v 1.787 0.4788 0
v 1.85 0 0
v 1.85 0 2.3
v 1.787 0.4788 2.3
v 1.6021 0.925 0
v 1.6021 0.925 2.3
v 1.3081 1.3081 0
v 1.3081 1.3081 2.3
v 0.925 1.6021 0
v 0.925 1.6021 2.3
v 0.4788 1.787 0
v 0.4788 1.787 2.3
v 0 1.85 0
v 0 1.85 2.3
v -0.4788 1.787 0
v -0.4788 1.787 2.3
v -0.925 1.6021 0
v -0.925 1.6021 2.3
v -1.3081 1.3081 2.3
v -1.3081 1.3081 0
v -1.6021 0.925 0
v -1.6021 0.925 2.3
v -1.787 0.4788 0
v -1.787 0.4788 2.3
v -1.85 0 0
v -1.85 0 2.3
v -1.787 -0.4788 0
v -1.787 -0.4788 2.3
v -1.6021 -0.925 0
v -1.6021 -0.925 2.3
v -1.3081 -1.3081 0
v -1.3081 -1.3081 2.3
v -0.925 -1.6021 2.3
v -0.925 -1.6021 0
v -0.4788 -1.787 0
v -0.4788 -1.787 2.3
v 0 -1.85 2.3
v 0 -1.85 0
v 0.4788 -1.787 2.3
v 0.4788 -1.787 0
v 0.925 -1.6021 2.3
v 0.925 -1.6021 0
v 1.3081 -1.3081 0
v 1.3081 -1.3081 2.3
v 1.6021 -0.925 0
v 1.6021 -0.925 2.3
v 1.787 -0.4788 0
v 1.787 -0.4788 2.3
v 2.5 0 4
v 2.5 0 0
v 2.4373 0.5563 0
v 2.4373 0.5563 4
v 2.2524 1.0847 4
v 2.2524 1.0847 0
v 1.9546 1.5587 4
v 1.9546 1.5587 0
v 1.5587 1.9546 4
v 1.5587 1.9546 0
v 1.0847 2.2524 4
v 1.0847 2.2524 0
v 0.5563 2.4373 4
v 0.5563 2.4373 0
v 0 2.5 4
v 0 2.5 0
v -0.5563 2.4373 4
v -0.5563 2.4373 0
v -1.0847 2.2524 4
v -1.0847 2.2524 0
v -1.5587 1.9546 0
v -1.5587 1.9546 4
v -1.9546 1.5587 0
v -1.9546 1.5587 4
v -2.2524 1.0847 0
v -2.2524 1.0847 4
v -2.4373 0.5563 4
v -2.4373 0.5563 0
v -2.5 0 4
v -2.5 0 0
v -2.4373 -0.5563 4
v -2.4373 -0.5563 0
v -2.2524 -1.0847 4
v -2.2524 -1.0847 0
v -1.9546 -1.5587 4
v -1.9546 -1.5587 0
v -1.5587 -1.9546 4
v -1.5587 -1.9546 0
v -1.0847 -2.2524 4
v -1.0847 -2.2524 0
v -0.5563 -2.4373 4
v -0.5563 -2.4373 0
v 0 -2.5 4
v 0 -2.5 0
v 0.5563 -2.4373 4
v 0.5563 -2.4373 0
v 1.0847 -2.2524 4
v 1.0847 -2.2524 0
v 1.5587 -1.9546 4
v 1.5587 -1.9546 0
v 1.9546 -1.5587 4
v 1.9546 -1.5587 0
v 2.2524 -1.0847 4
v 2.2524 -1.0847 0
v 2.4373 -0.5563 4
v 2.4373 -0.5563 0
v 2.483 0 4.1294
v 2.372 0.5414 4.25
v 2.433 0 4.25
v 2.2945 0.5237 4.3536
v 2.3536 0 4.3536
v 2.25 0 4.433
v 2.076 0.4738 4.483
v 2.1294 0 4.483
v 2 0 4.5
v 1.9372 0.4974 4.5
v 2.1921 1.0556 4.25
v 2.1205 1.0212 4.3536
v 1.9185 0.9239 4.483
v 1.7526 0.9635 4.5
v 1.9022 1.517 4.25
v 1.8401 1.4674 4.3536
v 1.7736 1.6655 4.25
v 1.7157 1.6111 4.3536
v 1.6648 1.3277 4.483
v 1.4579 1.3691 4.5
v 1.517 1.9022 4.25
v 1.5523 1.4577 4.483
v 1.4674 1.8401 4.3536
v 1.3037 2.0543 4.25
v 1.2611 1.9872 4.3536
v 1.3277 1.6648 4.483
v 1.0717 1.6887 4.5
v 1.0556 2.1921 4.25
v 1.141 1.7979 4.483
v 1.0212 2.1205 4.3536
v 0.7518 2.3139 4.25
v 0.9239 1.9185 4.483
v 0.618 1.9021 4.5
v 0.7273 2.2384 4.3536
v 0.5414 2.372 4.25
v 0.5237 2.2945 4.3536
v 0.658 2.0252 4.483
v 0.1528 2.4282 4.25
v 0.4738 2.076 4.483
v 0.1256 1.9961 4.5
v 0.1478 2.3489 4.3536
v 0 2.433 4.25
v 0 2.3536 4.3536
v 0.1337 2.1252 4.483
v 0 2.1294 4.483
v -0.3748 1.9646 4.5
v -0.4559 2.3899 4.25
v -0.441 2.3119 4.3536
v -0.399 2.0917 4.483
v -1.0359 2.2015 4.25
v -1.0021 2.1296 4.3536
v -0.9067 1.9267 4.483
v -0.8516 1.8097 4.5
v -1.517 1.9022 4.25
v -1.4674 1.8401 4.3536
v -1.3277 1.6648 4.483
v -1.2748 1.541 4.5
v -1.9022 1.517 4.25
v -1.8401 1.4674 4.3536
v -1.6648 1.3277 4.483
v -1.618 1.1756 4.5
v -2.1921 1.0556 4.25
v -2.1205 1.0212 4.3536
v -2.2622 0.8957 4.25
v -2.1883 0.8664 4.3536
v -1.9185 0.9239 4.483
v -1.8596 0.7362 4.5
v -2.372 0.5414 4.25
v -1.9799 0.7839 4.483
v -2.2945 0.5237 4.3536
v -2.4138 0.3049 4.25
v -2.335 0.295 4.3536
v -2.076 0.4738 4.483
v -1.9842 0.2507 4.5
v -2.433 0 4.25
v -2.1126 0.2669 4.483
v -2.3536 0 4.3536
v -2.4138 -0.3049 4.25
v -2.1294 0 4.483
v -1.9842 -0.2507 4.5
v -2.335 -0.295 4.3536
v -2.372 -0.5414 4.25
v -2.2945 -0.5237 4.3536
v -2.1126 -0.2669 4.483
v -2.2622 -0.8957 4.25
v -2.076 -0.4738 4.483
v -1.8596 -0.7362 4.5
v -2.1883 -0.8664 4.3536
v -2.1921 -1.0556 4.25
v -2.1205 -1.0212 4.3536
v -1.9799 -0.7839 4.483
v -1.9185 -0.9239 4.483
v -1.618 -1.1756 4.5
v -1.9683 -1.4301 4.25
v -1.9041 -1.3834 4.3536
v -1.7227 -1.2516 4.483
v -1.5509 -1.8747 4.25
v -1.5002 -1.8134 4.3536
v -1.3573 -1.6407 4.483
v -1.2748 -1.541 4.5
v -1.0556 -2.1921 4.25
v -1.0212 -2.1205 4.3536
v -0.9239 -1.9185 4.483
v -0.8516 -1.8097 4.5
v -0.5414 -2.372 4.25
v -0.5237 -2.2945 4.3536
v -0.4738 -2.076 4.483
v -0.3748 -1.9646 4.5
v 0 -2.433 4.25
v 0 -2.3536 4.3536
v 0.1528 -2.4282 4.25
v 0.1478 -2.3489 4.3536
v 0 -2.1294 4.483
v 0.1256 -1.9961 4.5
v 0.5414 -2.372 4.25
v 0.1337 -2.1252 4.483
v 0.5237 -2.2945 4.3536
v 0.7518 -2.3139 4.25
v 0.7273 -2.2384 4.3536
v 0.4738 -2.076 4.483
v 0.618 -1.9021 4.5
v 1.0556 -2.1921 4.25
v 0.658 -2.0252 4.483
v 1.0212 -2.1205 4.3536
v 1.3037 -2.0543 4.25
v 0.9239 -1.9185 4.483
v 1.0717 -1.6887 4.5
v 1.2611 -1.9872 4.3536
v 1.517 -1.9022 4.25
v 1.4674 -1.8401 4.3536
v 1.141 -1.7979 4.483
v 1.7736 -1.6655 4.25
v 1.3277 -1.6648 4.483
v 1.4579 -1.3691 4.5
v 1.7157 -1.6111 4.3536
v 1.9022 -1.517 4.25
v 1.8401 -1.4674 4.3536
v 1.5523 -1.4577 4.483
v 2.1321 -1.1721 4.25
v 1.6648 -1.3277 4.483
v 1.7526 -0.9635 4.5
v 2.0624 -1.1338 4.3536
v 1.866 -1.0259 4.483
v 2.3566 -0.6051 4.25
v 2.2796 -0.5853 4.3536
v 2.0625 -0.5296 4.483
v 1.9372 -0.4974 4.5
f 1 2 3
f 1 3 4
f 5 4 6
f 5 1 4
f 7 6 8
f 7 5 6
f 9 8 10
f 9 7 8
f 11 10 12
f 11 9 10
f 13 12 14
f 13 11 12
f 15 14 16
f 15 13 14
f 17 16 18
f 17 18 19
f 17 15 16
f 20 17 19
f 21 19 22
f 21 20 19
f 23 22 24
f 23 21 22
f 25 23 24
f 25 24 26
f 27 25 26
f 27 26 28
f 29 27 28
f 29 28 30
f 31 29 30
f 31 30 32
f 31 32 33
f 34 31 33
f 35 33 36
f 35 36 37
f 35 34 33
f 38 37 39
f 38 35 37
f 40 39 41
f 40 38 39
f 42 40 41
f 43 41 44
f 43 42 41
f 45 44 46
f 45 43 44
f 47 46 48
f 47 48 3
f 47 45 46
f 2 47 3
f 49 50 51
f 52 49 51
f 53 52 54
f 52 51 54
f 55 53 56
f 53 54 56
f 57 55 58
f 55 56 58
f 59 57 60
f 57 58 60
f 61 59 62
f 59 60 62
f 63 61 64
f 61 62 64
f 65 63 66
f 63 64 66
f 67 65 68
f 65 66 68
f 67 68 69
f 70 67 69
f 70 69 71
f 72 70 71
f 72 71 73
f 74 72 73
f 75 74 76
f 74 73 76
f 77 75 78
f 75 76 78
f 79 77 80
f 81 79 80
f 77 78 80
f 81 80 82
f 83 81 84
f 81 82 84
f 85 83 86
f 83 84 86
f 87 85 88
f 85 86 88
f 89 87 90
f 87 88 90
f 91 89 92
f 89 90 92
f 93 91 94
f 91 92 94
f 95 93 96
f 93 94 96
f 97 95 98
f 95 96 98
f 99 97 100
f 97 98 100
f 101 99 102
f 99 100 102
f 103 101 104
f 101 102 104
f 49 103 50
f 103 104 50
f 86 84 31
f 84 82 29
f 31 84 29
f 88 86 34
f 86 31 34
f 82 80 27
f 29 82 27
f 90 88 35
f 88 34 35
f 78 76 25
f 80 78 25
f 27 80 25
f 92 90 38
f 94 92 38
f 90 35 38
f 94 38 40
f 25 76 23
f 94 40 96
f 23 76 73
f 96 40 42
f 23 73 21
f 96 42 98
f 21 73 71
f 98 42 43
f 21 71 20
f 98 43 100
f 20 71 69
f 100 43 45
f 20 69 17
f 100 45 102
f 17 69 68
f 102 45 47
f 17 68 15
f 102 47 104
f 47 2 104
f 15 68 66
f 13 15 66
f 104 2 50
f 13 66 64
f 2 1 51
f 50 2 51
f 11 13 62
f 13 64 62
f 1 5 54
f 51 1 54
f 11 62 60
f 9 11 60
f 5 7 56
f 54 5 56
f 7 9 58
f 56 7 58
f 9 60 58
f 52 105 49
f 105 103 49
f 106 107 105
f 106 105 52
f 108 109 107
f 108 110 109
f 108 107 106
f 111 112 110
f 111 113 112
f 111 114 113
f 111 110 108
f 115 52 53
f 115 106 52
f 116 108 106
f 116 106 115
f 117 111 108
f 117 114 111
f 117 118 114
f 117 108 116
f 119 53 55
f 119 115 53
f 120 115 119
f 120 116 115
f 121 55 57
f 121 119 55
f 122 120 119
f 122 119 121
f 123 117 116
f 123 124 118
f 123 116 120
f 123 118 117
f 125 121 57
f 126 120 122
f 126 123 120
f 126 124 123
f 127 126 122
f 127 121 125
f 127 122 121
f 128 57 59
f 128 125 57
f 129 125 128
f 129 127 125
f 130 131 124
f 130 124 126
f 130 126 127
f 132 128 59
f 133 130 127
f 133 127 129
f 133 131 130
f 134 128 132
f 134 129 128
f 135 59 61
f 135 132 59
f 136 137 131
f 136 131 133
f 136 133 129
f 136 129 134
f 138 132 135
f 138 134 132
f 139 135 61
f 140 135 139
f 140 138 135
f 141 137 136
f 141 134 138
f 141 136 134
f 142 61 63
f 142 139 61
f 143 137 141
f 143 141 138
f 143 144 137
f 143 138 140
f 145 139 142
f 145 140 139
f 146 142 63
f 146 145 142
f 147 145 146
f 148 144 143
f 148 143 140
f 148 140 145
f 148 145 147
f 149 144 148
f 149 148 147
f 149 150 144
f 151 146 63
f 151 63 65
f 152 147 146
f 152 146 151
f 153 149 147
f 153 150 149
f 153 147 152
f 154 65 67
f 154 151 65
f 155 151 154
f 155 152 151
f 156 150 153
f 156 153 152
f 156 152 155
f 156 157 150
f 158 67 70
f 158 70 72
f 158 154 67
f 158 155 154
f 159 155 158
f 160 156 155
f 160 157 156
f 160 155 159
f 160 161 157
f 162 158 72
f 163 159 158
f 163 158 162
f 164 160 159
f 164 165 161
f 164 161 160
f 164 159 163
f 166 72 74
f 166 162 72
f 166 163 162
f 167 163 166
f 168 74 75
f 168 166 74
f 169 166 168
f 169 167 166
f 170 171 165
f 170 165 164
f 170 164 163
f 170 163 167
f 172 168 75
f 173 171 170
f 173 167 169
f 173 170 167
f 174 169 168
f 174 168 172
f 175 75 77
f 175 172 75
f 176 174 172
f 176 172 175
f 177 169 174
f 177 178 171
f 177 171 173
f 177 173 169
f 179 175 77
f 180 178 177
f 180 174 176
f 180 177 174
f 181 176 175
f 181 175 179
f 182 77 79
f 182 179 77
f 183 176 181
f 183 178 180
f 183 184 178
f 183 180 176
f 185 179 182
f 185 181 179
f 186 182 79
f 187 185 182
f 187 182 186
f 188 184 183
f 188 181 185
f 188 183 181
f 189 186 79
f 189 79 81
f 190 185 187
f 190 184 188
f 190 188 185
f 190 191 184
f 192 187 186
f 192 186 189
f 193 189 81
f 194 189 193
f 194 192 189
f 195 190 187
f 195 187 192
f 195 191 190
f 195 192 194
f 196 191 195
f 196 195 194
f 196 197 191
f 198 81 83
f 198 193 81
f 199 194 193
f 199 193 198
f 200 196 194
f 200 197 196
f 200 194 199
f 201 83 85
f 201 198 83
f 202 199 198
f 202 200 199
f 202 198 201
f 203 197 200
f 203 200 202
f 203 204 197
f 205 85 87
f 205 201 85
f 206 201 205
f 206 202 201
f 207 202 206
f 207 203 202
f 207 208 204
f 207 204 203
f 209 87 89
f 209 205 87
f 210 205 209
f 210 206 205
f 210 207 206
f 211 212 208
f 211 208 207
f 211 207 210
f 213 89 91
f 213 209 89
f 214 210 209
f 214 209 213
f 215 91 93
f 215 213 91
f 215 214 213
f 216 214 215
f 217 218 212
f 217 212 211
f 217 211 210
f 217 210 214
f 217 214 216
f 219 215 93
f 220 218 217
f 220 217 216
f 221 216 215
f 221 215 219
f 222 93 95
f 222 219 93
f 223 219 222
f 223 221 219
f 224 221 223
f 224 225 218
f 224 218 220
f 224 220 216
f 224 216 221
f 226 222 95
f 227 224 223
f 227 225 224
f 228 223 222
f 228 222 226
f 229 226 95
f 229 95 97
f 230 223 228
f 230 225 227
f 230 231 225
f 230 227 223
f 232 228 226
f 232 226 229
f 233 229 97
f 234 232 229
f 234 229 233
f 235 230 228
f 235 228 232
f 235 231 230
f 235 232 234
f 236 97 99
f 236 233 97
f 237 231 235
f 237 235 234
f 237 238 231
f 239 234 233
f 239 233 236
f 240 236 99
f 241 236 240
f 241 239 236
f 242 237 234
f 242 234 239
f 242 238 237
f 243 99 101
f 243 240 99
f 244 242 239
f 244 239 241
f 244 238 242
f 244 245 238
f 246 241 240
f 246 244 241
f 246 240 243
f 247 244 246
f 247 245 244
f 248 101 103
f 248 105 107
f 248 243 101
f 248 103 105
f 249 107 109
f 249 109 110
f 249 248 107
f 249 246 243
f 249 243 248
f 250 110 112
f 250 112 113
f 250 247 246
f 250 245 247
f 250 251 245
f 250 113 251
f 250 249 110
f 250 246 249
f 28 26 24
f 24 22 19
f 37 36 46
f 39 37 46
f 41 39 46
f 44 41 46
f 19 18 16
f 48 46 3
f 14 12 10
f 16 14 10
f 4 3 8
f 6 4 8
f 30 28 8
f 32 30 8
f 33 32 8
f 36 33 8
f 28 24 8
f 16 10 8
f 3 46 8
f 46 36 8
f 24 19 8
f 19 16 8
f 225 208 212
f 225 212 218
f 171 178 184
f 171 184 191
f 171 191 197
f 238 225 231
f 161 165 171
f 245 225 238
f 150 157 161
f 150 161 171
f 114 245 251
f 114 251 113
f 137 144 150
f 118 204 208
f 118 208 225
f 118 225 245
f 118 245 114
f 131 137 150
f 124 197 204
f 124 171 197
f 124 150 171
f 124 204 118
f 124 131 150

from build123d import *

# Parameters (mm, degrees)
F0_R     = 2.5
F0_R_2   = 1.85
F1_DEPTH = 4.5
F2_R     = 0.5
F3_DEPTH = 2.3


with BuildPart() as f1:
    # F0 (on Top) → F1 (new body)
    with BuildSketch(Plane.XY):
        Circle(F0_R)
        Circle(F0_R_2, mode=Mode.SUBTRACT)
        Circle(F0_R_2)
    extrude(amount=F1_DEPTH)

    # F2
    f2_edges = [f1.edges().sort_by_distance(p)[0] for p in [
        (-2.5, 0, 4.5),
    ]]
    fillet(f2_edges, radius=F2_R)

    # F0 (on Top) → F3 (cut)
    with BuildSketch(Plane.XY):
        Circle(F0_R_2)
    extrude(amount=F3_DEPTH, mode=Mode.SUBTRACT)


solid = f1.part
